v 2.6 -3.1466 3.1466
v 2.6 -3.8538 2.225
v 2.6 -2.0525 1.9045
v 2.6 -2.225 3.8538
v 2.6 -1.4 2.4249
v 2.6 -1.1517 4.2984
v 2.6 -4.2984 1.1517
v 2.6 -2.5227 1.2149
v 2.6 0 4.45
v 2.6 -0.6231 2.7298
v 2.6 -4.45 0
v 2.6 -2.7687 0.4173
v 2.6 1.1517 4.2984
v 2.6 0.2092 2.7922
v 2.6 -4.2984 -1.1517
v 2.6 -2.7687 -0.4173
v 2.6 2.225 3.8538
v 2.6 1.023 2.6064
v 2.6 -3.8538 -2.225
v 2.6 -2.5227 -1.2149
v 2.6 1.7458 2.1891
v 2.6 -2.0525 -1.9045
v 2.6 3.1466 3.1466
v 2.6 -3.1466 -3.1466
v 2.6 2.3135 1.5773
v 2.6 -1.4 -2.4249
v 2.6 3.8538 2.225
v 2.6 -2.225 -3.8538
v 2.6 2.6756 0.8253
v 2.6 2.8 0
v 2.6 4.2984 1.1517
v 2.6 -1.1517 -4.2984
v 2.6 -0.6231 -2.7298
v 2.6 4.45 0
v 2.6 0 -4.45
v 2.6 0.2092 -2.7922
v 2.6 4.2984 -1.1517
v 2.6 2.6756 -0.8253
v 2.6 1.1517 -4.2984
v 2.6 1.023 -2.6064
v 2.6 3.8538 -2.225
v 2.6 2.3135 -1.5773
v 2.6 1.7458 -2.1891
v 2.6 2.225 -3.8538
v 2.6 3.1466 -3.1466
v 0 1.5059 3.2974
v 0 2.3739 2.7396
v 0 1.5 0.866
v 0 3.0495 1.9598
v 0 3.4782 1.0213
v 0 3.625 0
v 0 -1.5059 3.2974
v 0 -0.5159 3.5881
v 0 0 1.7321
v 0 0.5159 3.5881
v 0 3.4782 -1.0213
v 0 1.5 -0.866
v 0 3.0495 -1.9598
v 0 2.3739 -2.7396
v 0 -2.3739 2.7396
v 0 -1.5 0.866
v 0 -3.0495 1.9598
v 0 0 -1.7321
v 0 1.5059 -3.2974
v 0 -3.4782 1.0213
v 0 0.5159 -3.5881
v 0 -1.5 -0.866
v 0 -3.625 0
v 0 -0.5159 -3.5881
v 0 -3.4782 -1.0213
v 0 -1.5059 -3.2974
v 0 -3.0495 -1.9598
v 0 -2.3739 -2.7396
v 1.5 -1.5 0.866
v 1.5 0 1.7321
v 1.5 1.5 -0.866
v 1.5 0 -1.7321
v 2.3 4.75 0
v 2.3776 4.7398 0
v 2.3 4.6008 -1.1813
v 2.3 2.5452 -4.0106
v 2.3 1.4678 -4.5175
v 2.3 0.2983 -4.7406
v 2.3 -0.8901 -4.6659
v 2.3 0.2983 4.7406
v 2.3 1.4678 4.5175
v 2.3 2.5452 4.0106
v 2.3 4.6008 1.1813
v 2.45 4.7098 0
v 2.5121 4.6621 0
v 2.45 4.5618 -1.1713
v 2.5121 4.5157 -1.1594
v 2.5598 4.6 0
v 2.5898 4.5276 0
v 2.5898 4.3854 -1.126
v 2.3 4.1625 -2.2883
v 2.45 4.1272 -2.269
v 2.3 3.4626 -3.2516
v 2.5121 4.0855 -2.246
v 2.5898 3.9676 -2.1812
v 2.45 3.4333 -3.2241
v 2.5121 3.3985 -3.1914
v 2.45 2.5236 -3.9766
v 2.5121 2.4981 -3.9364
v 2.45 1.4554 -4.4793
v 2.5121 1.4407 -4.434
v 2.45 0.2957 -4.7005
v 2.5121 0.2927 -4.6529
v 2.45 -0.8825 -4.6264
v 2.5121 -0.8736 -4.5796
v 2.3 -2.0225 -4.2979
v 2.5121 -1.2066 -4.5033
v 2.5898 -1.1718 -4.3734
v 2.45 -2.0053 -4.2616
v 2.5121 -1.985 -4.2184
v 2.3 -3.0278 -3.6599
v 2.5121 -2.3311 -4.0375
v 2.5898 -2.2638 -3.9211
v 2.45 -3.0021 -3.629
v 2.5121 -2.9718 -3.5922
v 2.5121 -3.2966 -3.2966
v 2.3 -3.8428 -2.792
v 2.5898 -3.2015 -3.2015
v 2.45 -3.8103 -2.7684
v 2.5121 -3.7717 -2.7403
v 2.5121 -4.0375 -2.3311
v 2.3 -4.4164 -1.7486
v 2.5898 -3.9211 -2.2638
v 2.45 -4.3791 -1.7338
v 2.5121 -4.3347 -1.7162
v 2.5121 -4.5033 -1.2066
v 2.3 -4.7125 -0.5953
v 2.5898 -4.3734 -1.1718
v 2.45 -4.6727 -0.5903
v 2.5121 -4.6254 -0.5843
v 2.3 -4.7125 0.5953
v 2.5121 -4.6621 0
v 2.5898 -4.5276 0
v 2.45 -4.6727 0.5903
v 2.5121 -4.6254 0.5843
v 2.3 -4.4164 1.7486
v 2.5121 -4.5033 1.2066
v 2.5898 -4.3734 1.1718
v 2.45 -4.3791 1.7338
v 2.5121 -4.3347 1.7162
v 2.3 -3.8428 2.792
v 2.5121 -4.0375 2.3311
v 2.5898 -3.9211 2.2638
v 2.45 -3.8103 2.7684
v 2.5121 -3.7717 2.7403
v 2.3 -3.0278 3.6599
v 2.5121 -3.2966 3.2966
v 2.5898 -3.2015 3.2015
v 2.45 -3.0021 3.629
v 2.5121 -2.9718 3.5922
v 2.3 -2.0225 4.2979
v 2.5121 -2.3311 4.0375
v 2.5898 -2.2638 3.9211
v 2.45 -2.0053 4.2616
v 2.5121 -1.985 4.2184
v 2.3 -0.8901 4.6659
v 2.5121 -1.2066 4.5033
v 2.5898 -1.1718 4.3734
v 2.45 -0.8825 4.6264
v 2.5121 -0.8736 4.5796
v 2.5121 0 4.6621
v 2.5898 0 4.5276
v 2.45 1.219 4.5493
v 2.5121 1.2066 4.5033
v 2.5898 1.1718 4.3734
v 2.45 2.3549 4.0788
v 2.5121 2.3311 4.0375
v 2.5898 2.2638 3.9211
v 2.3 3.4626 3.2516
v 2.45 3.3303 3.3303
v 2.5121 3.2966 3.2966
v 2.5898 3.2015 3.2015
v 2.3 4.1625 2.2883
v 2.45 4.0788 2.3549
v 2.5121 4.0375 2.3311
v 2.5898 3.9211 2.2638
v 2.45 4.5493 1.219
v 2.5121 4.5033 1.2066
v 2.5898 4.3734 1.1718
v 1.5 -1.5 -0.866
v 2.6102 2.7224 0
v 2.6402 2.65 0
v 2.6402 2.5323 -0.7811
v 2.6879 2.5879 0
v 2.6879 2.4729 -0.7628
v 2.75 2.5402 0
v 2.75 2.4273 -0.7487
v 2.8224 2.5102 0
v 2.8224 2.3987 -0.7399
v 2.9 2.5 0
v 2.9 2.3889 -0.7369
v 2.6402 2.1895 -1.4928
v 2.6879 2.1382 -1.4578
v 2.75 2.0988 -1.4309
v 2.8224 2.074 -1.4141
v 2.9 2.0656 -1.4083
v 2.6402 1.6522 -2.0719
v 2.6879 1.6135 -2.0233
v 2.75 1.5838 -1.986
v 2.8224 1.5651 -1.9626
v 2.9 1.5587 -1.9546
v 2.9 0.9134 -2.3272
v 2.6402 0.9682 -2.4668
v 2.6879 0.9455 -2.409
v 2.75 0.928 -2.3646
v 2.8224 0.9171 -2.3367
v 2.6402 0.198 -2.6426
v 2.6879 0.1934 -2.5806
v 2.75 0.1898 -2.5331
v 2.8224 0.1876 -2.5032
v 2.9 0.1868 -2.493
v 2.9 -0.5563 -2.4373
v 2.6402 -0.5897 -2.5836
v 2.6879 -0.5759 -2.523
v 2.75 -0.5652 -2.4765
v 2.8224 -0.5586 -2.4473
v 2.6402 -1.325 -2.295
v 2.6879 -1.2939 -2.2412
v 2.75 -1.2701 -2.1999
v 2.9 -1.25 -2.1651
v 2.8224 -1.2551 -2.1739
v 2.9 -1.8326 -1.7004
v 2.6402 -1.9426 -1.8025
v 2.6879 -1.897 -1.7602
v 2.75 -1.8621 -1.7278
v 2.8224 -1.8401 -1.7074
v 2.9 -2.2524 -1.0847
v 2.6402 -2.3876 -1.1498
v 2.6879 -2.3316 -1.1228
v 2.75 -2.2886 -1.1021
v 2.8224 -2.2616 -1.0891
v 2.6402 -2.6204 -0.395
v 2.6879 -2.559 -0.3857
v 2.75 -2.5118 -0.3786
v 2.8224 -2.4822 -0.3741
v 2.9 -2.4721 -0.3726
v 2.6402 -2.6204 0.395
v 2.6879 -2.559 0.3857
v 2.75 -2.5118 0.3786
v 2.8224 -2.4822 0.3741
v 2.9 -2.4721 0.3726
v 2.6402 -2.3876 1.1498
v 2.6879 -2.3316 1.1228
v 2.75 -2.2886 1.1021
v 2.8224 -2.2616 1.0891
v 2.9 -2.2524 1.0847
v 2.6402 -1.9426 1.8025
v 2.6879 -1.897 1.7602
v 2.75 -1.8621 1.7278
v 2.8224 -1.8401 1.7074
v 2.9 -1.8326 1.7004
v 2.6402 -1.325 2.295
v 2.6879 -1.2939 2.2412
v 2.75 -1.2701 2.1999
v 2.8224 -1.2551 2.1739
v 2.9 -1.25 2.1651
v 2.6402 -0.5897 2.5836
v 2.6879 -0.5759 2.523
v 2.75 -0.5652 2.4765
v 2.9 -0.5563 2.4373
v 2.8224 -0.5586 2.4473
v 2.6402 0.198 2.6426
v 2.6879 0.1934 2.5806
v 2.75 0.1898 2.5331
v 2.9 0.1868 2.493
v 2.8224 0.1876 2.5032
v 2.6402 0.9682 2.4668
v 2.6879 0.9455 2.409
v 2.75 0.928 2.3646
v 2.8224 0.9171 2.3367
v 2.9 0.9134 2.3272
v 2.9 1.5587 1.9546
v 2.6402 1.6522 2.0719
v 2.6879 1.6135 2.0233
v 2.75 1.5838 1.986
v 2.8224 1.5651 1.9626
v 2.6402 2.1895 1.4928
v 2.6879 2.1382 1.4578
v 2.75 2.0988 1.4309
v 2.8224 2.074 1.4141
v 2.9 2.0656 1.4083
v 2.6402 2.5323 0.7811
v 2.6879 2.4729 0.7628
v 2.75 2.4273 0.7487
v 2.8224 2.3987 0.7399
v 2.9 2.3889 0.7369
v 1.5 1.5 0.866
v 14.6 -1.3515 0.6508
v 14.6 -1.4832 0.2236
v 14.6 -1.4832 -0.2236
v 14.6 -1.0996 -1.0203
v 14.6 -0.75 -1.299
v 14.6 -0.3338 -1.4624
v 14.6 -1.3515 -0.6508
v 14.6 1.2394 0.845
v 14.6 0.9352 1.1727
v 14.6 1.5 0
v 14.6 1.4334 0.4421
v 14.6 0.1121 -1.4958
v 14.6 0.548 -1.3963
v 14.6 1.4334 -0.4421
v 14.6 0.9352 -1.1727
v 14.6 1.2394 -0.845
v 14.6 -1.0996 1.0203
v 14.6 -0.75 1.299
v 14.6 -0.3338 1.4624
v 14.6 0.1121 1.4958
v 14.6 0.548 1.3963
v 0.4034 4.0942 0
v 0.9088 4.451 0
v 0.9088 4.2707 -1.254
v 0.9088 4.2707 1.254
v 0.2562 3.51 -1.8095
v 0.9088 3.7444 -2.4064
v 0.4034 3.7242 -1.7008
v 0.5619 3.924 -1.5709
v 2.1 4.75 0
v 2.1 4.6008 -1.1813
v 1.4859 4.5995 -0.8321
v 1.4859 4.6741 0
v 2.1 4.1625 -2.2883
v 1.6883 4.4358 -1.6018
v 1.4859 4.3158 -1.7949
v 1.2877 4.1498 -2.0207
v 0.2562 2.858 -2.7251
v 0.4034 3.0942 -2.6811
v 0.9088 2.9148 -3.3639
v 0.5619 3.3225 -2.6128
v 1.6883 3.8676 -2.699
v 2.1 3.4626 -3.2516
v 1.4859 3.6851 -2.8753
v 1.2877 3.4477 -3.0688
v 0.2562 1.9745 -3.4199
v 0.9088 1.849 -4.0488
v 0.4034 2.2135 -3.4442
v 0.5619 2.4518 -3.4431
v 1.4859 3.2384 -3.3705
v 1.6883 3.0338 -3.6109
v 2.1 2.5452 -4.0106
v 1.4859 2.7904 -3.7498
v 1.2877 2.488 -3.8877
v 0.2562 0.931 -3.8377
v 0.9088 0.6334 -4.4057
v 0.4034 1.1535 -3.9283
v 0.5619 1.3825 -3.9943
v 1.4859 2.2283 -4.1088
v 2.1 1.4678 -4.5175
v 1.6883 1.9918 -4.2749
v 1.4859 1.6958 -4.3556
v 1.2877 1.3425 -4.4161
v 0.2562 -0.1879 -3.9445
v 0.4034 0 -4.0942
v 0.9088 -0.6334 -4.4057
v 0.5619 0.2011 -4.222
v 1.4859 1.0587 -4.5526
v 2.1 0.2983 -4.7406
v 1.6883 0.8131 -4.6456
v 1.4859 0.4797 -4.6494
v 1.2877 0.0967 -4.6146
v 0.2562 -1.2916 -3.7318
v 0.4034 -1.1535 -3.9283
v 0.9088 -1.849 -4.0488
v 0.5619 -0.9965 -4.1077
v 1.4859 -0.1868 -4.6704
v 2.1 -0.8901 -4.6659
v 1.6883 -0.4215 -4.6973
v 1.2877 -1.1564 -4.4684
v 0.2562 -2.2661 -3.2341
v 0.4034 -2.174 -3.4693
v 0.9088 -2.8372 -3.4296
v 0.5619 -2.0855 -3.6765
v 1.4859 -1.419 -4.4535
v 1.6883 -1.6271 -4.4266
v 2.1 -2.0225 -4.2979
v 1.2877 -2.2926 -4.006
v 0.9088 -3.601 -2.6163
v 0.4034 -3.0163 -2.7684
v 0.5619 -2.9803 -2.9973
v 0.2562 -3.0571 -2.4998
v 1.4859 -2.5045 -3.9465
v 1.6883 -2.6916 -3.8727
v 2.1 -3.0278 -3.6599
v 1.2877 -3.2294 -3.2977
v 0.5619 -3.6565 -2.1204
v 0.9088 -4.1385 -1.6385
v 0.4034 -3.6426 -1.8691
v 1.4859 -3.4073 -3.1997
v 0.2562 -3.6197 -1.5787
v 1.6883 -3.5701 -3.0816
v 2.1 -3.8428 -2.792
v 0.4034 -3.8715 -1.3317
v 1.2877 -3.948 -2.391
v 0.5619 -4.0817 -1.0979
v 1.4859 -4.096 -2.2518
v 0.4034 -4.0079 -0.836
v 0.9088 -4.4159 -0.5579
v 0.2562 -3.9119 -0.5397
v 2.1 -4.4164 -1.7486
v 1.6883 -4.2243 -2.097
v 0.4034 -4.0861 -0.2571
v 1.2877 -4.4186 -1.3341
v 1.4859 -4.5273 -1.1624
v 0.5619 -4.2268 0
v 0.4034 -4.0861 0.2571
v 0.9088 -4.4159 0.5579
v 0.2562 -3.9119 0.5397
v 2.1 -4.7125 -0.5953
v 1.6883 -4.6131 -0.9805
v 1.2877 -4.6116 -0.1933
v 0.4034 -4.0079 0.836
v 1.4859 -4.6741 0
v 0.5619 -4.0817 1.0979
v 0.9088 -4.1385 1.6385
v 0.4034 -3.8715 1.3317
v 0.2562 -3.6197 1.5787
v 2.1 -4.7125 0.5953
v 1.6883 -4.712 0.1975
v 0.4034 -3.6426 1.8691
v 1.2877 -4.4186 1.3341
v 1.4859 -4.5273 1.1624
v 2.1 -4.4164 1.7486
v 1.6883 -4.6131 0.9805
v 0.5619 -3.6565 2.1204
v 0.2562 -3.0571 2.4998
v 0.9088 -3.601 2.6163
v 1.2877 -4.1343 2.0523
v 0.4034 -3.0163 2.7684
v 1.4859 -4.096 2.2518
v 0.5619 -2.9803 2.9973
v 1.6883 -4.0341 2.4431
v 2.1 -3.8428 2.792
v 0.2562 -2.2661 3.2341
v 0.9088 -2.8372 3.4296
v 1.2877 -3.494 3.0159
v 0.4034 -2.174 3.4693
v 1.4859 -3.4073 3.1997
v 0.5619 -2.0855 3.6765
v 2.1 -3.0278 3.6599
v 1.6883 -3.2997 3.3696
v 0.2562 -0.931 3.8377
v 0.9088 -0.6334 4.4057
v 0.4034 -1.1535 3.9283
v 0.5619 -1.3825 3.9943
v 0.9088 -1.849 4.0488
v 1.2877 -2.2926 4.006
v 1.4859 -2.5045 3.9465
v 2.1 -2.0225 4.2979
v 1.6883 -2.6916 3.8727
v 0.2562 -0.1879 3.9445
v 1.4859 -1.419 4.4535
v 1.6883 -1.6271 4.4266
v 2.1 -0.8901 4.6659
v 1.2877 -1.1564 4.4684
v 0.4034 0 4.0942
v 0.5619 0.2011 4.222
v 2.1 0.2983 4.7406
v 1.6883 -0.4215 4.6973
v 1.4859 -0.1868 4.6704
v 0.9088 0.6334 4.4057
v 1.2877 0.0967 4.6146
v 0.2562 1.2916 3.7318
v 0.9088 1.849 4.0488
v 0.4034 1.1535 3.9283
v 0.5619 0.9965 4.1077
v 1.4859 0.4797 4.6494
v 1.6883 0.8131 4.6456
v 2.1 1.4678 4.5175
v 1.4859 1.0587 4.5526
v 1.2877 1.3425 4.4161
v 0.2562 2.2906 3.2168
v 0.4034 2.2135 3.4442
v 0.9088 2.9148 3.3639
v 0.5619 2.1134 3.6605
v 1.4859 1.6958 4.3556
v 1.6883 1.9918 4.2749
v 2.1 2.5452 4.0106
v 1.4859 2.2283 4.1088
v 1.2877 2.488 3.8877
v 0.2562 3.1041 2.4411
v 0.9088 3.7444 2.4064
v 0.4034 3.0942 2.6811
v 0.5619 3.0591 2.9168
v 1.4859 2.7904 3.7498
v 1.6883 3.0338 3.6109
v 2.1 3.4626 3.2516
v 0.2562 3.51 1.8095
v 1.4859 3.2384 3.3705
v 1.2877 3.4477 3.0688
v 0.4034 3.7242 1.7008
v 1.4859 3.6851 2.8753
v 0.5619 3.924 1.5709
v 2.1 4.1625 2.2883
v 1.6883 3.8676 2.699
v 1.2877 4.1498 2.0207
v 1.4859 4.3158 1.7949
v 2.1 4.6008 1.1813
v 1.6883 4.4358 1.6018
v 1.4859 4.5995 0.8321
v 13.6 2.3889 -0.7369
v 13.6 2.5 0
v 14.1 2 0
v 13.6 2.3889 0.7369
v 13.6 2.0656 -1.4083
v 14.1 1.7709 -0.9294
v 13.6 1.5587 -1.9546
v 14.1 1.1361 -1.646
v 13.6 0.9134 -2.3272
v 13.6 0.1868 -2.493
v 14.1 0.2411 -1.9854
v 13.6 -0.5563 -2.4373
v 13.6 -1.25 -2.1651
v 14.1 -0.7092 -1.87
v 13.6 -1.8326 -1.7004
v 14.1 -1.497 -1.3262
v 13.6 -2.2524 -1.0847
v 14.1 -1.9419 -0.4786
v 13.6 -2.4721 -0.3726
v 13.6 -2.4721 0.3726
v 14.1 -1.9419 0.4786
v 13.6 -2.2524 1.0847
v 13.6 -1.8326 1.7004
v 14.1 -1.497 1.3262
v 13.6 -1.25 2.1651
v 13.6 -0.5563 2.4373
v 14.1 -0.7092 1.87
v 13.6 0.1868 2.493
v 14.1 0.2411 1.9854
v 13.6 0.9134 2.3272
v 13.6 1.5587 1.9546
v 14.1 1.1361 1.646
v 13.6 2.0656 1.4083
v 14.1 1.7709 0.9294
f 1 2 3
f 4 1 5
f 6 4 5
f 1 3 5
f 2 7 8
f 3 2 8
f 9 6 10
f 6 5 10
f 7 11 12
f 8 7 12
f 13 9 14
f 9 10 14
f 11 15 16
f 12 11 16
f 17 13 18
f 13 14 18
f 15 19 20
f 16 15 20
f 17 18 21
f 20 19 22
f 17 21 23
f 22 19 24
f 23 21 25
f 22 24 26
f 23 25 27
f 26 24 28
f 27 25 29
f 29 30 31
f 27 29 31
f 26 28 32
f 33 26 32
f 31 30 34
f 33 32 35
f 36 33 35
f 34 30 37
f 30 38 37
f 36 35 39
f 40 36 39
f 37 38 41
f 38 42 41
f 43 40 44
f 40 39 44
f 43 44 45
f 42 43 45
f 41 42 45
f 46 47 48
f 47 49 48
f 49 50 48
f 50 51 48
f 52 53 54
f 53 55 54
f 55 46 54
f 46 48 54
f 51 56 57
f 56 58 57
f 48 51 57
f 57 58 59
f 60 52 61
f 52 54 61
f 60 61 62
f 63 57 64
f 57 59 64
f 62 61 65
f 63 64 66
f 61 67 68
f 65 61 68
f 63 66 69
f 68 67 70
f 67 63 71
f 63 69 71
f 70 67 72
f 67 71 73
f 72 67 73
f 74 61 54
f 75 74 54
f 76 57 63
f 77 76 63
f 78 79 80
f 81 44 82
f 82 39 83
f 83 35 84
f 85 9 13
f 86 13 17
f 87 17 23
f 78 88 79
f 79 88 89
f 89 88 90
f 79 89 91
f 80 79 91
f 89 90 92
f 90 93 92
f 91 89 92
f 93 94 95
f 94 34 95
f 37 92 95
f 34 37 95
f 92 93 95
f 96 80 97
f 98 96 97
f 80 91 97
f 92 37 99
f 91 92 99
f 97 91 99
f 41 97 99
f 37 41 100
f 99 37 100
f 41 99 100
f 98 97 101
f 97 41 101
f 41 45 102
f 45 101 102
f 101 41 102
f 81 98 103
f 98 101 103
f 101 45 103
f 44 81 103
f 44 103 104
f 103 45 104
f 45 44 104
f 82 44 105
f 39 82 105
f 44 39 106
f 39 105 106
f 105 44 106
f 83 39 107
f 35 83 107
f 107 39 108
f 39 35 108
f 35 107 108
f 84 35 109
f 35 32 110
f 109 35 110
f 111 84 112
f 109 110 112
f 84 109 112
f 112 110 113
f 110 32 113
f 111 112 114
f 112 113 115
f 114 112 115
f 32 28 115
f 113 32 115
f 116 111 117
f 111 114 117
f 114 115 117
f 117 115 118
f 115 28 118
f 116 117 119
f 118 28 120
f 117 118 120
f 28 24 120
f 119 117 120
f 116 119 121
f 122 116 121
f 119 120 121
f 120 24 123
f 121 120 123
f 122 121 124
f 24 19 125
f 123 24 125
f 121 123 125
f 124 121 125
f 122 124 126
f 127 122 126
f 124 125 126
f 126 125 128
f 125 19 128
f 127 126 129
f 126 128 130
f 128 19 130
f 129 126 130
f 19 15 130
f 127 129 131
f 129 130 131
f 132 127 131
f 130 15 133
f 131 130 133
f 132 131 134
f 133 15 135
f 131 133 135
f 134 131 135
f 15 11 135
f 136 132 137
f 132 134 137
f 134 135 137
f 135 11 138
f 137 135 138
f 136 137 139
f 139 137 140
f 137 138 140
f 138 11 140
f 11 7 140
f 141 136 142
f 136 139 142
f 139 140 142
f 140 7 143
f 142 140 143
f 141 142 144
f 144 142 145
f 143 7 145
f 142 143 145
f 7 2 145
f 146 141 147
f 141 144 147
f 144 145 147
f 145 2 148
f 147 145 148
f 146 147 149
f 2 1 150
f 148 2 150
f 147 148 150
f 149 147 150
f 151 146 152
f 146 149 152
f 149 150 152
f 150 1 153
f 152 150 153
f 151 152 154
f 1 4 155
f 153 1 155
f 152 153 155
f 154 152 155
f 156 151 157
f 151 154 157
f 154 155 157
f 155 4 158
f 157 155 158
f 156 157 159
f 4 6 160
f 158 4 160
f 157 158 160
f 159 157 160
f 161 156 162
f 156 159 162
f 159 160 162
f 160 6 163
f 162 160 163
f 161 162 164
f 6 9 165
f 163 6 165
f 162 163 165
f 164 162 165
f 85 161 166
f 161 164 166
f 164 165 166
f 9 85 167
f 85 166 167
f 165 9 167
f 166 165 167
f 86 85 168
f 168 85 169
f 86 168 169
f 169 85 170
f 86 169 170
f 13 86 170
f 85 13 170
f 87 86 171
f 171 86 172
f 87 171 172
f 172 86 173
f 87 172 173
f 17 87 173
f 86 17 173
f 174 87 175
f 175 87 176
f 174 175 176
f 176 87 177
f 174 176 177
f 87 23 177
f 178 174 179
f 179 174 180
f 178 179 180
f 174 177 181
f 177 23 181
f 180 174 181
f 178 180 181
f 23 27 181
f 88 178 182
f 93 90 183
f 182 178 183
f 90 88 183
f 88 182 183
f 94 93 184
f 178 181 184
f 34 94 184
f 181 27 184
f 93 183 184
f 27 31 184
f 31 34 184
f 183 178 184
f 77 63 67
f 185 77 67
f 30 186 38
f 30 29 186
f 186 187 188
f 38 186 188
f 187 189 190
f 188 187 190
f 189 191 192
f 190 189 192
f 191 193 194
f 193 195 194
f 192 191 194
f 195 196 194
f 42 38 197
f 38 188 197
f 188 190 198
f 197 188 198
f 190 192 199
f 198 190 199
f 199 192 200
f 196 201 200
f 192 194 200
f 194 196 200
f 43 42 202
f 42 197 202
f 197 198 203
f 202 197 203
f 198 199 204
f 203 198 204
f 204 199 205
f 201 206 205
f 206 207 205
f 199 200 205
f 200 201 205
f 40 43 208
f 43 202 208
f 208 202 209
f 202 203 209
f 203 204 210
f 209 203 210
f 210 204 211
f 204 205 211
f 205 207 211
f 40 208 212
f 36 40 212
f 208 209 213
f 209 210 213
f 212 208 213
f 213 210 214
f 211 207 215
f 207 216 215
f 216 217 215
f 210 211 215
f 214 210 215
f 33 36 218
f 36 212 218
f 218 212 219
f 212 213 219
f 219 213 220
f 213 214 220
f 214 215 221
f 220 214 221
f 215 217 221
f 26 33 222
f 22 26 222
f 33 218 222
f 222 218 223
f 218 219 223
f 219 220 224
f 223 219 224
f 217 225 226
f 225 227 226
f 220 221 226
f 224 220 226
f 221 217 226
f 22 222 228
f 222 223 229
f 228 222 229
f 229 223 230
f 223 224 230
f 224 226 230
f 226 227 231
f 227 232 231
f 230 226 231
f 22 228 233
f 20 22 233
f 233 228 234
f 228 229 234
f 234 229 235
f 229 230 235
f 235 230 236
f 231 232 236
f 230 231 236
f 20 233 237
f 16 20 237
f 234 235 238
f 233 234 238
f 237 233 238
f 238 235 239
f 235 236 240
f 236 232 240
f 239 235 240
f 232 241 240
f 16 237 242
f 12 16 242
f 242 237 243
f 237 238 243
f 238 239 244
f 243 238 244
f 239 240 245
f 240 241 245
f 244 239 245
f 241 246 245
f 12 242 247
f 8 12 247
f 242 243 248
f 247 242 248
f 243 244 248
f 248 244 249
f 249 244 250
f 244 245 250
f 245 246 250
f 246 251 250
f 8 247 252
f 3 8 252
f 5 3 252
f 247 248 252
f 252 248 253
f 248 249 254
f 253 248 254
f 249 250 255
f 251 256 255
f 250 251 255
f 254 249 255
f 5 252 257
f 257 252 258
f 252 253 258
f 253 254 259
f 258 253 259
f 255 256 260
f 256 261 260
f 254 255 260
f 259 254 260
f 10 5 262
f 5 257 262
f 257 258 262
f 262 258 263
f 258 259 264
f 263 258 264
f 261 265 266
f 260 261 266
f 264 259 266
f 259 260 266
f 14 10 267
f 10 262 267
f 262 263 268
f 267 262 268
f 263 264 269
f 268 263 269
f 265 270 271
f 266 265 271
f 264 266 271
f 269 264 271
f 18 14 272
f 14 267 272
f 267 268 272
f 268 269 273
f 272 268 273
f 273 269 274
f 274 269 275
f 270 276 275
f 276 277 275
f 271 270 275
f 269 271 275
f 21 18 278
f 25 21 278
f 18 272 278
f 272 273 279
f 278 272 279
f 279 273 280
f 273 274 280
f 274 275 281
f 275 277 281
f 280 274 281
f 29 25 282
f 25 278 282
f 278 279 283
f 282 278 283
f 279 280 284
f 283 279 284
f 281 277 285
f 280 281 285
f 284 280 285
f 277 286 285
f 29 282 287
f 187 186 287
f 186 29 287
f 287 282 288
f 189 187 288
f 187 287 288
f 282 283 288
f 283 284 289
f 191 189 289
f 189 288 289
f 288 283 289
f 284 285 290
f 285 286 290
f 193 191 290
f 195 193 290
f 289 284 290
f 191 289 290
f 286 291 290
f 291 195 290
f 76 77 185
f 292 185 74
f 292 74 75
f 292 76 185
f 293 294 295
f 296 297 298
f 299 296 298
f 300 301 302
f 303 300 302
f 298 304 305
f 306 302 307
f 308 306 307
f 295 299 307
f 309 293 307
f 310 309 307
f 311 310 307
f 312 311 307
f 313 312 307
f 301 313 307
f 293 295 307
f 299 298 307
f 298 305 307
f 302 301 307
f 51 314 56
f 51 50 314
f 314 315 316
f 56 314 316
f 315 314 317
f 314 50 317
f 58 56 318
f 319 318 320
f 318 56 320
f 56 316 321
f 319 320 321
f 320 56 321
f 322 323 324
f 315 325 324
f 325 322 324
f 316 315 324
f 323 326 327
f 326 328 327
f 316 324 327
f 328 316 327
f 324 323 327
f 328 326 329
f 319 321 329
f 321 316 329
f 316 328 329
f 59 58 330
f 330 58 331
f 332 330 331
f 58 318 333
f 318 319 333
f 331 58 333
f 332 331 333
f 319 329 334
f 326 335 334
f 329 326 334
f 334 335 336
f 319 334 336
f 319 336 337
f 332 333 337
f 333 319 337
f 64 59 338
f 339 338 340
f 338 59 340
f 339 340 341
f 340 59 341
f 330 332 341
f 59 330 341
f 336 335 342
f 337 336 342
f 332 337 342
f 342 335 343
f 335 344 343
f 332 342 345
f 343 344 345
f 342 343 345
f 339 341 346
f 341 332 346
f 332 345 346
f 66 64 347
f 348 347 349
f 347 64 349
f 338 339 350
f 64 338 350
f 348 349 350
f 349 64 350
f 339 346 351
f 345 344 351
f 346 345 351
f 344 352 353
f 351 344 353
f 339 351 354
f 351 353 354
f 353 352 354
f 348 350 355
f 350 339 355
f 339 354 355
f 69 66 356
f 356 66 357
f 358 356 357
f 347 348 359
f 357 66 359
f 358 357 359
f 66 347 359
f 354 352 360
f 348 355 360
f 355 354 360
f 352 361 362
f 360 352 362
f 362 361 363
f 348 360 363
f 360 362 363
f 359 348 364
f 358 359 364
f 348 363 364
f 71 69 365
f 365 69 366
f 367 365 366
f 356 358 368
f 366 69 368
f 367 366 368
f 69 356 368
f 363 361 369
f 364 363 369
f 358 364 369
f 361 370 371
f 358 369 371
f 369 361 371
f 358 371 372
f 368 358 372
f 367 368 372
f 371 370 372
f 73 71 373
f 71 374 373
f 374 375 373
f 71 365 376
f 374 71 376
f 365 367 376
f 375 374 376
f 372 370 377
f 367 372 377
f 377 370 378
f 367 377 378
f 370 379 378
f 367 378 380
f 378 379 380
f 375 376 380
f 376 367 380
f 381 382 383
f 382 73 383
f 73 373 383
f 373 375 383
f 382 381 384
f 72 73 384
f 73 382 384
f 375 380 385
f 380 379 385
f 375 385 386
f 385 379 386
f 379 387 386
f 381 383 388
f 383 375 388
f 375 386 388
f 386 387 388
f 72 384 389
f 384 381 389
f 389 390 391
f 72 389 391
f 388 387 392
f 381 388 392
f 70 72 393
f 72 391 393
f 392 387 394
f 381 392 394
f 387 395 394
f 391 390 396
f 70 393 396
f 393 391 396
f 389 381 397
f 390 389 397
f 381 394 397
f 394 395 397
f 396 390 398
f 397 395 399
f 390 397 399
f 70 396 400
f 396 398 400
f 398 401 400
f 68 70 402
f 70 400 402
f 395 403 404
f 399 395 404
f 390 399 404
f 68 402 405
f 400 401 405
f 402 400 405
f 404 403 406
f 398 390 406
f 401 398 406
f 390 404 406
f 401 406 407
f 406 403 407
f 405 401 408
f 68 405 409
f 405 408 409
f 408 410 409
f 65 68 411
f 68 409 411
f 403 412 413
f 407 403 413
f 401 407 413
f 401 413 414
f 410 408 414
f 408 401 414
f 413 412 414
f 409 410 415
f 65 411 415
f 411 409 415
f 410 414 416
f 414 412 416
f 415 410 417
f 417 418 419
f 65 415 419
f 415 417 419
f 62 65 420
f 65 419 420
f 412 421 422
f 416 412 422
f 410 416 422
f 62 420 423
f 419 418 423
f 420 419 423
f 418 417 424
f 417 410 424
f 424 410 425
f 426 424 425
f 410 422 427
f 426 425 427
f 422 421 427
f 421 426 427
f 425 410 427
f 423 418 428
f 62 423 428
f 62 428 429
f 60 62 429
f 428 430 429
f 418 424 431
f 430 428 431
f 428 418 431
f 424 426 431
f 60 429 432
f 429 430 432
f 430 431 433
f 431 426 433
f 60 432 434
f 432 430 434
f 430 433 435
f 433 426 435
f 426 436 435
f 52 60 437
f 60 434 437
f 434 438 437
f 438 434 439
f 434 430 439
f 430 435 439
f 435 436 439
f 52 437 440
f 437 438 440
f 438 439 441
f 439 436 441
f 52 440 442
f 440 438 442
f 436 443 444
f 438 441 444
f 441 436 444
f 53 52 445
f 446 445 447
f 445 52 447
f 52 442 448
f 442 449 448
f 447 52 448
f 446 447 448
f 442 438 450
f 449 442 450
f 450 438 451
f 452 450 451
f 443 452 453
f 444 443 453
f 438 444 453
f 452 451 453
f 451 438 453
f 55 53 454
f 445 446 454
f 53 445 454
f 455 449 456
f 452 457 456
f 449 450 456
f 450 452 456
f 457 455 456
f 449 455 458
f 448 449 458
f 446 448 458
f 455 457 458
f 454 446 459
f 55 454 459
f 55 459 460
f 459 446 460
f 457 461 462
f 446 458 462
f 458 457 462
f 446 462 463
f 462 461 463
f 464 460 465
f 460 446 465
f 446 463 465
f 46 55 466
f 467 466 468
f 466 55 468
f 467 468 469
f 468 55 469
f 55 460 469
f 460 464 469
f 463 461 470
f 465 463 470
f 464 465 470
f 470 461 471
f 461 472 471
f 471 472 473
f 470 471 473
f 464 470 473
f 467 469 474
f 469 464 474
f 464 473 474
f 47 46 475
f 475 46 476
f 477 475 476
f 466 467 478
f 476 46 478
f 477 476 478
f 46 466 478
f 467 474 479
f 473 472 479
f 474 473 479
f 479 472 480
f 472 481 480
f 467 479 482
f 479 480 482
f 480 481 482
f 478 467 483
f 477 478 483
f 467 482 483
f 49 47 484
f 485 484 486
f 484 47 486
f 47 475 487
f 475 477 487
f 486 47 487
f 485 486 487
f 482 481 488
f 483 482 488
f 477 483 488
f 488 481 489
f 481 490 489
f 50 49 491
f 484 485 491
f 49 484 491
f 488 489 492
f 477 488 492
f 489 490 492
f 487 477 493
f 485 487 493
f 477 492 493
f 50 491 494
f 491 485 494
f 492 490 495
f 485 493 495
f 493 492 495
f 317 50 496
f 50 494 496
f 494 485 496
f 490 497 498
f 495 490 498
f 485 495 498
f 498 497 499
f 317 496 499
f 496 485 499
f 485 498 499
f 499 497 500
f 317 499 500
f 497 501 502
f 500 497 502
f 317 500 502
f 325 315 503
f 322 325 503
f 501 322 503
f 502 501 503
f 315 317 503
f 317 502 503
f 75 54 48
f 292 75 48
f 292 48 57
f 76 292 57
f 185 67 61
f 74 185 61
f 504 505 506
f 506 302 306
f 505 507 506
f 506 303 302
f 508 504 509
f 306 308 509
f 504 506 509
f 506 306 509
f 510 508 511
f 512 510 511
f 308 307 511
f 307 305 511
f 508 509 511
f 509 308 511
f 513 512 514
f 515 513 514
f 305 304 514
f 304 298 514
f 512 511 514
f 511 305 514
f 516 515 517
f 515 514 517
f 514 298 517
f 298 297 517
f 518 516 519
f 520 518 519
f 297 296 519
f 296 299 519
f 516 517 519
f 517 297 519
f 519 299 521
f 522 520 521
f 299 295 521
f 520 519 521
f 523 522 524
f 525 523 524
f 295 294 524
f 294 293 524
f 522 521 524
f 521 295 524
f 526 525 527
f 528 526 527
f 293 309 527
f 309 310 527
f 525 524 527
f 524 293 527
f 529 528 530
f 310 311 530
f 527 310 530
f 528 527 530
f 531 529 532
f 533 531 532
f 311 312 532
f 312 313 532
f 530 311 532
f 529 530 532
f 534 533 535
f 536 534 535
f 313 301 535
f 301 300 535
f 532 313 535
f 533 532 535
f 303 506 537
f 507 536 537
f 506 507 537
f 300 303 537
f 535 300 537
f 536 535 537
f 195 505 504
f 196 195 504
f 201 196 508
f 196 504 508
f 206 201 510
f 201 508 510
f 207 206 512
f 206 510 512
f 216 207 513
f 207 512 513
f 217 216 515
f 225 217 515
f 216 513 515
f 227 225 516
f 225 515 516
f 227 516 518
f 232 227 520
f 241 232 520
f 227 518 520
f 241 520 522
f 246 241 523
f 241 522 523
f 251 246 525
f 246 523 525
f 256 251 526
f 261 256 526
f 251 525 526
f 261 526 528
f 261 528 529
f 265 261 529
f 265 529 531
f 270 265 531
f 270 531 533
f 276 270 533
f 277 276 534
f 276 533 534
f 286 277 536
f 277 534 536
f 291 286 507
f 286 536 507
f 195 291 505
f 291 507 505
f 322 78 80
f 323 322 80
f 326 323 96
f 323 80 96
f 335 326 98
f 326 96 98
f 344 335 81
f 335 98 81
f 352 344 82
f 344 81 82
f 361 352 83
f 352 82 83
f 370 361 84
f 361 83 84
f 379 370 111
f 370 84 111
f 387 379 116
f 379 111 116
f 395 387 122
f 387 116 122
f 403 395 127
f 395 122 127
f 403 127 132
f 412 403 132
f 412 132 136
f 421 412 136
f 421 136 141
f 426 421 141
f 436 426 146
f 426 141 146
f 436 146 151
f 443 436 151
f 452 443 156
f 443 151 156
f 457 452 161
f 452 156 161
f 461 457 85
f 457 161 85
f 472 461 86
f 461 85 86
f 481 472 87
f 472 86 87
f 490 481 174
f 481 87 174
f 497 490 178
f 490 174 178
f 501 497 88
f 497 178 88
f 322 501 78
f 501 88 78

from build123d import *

# Parameters (mm, degrees)
CUT_EXTRUDE_1_DEPTH = 1.5
FILLET_1_R          = 0.3
CHAMFER_1_SIZE      = 1


with BuildPart() as part:
    # Эскиз1 → Повернуть1 (revolve)
    with BuildSketch(Plane.XY):
        with BuildLine():
            Line((0, 0), (0, 3.625))
            ThreePointArc((0, 3.625), (0.908821487, 4.451033224), (2.1, 4.75))
            Line((2.1, 4.75), (2.6, 4.75))
            Line((2.6, 4.75), (2.6, 2.5))
            Line((2.6, 2.5), (14.6, 2.5))
            Line((14.6, 2.5), (14.6, 0))
            Line((14.6, 0), (0, 0))
        make_face()
    revolve(axis=Axis((14.6, 0, 0), (-1, 0, 0)))

    # Эскиз2 → Вырез-Вытянуть1 (cut)
    with BuildSketch(Plane.ZY):
        Polygon((0.866025404, 1.5), (-0.866025404, 1.5), (-1.732050808, 0), (-0.866025404, -1.5), (0.866025404, -1.5), (1.732050808, 0), align=None)
    extrude(amount=-CUT_EXTRUDE_1_DEPTH, mode=Mode.SUBTRACT)

    # Скругление1
    fillet_1_edges = [part.edges().sort_by_distance(p)[0] for p in [
        (2.6, -2.5, 0),
        (2.6, -4.75, 0),
    ]]
    fillet(fillet_1_edges, radius=FILLET_1_R)

    # Фаска1
    chamfer_1_edges = [part.edges().sort_by_distance(p)[0] for p in [
        (14.6, -2.5, 0),
    ]]
    chamfer(chamfer_1_edges, length=CHAMFER_1_SIZE)


solid = part.part
